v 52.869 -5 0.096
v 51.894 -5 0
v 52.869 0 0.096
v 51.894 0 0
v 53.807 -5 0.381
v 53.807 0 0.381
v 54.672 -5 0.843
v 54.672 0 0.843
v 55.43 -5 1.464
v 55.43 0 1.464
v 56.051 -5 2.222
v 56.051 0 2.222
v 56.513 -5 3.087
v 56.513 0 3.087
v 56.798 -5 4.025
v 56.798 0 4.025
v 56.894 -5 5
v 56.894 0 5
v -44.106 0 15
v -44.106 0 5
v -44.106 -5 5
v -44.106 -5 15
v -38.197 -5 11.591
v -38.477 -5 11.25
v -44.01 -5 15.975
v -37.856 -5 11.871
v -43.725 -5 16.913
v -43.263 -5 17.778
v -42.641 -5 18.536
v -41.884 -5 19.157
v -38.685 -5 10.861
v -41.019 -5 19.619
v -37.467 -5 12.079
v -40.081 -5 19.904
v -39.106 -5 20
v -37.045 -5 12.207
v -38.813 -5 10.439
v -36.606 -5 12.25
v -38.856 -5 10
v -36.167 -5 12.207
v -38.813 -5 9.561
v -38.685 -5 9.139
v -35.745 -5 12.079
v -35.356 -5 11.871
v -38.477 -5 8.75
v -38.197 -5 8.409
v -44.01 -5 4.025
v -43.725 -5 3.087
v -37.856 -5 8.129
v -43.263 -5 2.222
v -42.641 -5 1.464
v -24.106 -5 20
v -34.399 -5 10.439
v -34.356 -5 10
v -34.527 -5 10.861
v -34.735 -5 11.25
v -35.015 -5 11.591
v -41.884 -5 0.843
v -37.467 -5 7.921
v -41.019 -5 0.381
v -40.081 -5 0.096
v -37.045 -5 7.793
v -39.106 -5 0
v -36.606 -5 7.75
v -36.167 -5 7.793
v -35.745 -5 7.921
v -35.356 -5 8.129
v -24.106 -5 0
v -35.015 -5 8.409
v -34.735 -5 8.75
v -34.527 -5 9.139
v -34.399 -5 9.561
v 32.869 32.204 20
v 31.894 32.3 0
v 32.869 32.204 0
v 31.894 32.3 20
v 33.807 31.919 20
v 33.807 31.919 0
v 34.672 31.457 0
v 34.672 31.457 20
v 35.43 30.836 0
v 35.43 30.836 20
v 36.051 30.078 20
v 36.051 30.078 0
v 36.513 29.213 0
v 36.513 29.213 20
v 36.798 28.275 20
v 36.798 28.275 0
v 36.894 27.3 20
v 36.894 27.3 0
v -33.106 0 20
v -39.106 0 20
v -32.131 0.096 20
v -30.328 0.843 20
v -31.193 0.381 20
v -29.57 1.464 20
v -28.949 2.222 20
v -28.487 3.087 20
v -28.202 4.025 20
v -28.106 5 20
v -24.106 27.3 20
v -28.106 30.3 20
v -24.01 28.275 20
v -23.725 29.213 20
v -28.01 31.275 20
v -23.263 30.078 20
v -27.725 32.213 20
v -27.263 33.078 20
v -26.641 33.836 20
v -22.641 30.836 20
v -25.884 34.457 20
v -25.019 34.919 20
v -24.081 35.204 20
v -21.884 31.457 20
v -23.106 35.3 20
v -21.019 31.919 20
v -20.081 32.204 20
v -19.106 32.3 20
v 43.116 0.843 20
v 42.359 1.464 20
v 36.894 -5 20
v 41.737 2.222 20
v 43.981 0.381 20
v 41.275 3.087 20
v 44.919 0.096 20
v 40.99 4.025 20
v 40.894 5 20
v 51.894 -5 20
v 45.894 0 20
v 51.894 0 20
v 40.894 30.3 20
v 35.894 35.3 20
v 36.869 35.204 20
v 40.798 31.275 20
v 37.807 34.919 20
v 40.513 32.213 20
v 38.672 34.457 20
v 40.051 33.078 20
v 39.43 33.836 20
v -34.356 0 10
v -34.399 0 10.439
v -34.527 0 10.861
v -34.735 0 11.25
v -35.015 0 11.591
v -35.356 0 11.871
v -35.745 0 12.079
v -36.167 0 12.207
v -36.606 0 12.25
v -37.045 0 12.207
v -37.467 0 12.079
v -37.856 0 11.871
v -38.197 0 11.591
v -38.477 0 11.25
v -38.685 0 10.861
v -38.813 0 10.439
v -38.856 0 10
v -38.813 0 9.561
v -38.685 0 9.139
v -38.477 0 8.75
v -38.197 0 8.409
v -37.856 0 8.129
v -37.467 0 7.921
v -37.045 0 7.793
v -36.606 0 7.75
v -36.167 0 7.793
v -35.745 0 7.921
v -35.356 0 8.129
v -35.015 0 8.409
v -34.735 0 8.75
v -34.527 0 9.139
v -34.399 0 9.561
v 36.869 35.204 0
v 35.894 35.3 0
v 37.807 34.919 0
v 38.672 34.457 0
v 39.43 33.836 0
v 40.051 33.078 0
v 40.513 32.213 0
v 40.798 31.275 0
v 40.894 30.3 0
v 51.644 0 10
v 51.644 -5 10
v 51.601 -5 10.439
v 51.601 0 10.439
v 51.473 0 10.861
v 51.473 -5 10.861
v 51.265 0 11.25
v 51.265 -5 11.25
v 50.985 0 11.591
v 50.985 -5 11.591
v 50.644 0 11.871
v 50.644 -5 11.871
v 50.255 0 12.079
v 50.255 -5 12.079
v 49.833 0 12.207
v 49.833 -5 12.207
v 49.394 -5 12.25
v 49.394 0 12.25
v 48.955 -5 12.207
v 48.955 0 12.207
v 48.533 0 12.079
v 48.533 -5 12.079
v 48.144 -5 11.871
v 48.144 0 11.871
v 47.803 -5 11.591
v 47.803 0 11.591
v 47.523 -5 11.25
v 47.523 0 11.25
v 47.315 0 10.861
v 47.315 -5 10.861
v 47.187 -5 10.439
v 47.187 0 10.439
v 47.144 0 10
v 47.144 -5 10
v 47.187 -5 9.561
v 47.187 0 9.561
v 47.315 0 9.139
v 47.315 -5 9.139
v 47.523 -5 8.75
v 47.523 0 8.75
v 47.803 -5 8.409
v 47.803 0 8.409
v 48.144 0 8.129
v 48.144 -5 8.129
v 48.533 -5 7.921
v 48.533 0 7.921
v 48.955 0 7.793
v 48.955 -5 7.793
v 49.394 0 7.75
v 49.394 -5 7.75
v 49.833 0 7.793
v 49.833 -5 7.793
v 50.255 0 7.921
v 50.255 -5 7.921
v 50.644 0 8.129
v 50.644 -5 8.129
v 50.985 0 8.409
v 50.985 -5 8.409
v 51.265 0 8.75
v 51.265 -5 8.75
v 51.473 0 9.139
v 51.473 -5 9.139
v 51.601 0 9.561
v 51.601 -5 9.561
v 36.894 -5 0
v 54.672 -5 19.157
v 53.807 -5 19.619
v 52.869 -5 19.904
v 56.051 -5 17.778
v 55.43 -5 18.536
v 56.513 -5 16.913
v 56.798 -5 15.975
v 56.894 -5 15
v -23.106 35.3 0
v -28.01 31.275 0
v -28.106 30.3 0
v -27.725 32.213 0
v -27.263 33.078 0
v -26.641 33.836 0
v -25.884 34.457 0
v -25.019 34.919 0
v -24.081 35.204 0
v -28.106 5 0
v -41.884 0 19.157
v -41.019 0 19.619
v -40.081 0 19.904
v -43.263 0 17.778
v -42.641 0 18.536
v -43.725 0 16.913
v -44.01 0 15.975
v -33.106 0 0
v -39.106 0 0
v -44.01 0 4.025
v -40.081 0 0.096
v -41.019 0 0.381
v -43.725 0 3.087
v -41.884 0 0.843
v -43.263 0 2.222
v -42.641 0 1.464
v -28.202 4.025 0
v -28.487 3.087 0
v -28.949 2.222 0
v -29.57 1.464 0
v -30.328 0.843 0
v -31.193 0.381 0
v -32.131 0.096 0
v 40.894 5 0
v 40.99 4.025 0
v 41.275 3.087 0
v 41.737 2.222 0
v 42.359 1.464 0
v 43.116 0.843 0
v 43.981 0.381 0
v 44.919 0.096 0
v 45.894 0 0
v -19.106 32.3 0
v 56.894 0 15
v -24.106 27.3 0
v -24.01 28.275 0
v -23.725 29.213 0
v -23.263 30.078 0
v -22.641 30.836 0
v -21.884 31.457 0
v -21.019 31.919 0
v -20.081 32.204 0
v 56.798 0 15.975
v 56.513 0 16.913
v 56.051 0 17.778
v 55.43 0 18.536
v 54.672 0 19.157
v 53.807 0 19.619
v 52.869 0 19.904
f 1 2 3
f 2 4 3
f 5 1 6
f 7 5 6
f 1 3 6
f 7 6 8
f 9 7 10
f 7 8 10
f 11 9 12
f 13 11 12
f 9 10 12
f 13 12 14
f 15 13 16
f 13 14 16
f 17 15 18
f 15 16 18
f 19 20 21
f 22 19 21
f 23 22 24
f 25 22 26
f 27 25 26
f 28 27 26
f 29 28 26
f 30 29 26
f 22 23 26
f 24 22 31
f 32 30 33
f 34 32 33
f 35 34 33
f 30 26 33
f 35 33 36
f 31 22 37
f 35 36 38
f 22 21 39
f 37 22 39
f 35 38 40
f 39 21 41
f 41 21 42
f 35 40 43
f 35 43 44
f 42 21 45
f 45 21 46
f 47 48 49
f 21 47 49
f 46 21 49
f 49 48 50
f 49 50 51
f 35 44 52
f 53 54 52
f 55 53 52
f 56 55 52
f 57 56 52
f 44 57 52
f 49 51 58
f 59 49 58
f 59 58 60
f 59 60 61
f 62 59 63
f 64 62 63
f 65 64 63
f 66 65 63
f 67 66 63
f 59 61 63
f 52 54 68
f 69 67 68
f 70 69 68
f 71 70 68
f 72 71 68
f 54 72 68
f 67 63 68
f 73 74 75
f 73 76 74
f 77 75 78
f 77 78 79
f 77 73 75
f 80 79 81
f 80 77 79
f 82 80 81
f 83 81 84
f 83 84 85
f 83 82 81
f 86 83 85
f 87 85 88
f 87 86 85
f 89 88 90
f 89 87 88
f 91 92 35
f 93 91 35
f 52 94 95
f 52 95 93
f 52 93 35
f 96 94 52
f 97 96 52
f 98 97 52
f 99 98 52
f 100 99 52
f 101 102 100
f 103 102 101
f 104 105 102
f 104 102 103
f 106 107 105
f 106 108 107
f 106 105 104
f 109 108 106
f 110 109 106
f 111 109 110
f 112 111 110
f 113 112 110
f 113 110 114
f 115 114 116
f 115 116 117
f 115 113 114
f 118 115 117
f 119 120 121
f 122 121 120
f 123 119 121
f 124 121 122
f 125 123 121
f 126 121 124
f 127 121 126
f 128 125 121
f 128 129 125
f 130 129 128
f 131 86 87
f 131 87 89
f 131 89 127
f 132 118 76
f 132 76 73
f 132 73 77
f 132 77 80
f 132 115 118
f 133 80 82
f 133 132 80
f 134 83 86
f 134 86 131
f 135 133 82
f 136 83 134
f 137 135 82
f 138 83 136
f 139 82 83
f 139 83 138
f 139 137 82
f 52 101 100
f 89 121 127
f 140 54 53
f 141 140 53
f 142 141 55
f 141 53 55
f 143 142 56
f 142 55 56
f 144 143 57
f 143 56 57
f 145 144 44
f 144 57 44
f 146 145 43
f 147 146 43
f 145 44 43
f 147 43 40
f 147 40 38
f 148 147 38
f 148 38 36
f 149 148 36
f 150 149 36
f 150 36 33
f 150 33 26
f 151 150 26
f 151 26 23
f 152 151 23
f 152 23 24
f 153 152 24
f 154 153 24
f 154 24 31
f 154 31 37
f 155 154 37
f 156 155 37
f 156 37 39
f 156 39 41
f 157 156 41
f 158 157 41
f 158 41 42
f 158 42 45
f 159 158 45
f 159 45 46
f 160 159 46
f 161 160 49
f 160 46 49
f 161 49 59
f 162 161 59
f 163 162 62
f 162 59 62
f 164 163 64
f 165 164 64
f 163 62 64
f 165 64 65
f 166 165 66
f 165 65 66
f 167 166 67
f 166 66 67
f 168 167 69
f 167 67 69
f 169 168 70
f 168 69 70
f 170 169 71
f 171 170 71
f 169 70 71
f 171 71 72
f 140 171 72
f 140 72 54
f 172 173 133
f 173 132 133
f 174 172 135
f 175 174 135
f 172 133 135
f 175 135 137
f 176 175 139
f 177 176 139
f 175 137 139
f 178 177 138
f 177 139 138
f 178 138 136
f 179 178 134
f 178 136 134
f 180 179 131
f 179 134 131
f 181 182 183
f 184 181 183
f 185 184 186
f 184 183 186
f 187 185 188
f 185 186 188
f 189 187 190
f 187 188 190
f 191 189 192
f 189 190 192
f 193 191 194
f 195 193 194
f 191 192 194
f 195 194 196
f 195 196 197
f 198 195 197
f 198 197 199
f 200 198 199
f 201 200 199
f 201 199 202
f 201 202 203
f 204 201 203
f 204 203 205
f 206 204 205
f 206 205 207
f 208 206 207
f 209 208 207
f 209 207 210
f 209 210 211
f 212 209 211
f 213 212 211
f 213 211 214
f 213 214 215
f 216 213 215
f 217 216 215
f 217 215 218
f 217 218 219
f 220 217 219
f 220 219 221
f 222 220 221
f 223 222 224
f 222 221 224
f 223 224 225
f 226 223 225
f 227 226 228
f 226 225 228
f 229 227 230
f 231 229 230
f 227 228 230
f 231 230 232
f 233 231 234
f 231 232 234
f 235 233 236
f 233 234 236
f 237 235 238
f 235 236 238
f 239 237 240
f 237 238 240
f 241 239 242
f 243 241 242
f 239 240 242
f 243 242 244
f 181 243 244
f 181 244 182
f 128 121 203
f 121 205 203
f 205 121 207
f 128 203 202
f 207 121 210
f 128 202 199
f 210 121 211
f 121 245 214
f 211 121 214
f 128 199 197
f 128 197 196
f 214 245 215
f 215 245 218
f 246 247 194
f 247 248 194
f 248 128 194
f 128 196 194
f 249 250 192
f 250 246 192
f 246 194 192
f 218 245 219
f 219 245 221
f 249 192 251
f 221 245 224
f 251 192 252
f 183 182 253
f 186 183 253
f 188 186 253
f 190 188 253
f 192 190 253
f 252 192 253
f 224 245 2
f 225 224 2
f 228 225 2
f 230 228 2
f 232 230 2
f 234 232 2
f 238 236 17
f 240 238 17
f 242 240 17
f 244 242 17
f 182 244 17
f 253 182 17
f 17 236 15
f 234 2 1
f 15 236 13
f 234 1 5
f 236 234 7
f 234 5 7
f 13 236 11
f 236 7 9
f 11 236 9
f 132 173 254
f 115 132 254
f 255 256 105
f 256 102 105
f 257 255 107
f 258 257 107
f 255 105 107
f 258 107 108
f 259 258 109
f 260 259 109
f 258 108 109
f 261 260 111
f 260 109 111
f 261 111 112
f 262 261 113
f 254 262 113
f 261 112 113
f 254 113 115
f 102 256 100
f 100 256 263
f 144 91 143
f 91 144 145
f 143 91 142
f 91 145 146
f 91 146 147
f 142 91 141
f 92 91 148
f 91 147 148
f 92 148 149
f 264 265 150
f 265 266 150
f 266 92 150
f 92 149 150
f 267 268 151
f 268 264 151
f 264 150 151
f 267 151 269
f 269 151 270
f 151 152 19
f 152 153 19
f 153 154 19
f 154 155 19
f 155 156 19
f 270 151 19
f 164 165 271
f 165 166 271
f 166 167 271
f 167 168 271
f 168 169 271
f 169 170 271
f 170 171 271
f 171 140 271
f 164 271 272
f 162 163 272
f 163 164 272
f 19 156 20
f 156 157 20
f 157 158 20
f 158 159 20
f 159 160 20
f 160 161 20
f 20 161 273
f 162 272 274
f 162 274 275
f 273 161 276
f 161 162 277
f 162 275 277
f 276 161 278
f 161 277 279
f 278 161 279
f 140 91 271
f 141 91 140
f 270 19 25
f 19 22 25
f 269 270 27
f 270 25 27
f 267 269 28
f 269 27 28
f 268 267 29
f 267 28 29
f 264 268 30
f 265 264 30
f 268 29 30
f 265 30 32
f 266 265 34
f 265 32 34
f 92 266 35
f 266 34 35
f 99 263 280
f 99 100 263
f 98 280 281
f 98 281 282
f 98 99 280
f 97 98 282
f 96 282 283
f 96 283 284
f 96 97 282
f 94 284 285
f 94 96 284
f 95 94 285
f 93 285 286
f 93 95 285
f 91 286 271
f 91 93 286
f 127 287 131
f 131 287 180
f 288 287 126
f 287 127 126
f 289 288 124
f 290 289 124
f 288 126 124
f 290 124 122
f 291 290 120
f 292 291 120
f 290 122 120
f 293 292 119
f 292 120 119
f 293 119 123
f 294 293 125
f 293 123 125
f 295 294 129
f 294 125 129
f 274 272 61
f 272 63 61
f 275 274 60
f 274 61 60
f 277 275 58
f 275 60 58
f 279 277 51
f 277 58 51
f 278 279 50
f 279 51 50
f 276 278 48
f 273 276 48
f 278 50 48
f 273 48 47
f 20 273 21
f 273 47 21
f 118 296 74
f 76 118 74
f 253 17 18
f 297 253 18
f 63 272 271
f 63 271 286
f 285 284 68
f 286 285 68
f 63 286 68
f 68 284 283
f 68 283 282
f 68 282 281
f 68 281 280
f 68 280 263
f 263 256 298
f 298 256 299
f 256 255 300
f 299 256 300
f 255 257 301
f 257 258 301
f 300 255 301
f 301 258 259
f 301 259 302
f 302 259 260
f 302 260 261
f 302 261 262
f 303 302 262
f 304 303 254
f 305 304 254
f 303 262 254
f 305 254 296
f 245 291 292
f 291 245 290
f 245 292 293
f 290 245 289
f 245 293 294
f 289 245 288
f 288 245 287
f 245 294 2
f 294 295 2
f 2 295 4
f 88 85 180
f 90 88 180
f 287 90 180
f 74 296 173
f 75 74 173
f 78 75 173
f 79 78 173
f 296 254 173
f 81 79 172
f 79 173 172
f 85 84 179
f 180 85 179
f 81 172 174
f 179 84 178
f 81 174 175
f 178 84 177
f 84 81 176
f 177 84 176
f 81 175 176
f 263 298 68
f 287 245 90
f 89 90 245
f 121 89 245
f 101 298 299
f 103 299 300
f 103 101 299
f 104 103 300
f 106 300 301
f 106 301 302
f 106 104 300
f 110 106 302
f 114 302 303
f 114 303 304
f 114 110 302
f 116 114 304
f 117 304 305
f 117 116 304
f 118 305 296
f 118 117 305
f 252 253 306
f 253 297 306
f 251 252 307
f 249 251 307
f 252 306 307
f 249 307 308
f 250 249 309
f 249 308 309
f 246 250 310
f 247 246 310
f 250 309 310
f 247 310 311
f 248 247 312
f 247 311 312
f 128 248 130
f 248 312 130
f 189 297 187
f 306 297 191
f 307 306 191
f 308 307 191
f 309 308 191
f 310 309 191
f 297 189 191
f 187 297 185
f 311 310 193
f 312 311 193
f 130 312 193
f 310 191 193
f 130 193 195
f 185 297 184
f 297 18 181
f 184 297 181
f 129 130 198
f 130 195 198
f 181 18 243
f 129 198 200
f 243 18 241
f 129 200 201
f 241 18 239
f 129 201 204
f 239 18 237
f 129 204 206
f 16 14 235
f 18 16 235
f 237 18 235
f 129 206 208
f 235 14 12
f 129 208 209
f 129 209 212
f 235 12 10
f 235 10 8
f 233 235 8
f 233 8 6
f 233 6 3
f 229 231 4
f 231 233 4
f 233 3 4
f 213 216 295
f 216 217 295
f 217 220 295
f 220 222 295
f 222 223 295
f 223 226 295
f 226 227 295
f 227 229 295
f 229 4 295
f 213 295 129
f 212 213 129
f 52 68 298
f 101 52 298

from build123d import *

# Parameters (mm, degrees)
F0_W     = 61
F0_H     = 3
F0_W_2   = 4
F0_H_2   = 32.3
F1_DEPTH = 20
F2_R     = 5
F5_D     = 4.5
F6_R     = 5
F7_R     = 5
F8_R     = 5


with BuildPart() as f1:
    # F0 (on Top) → F1 (new body)
    with BuildSketch(Plane.XY):
        Polygon((-28.105963, 0), (-44.105963, 0), (-44.105963, -5), (-24.105963, -5), (-24.105963, 0), align=None)
        Polygon((-28.105963, 35.3), (-28.105963, 0), (-24.105963, 0), (-24.105963, 32.3), (-24.105963, 35.3), align=None)
        with Locations((6.394037, 33.8)):
            Rectangle(F0_W, F0_H)
        with Locations((38.894037, 33.8)):
            Rectangle(F0_W_2, F0_H)
        with Locations((38.894037, 16.15)):
            Rectangle(F0_W_2, F0_H_2)
        Polygon((40.894037, 0), (36.894037, 0), (36.894037, -5), (56.894037, -5), (56.894037, 0), align=None)
    extrude(amount=F1_DEPTH)

    # F2
    f2_edges = [f1.edges().sort_by_distance(p)[0] for p in [
        (-24.105963, 32.3, 10),
        (36.894037, 32.3, 10),
    ]]
    fillet(f2_edges, radius=F2_R)

    # F5 (through all)
    with Locations(Plane(origin=(0, 0, 0), x_dir=(-1, 0, 0), z_dir=(0, 1, 0))):
        with Locations((36.605963, 10), (-49.394037, 10)):
            Hole(F5_D / 2)

    # F6
    f6_edges = [f1.edges().sort_by_distance(p)[0] for p in [
        (-28.105963, 35.3, 10),
        (40.894037, 35.3, 10),
    ]]
    fillet(f6_edges, radius=F6_R)

    # F7
    f7_edges = [f1.edges().sort_by_distance(p)[0] for p in [
        (-28.105963, 0, 10),
        (40.894037, 0, 10),
    ]]
    fillet(f7_edges, radius=F7_R)

    # F8
    f8_edges = [f1.edges().sort_by_distance(p)[0] for p in [
        (56.894037, -2.5, 20),
        (56.894037, -2.5, 0),
        (-44.105963, -2.5, 0),
        (-44.105963, -2.5, 20),
    ]]
    fillet(f8_edges, radius=F8_R)


solid = f1.part
